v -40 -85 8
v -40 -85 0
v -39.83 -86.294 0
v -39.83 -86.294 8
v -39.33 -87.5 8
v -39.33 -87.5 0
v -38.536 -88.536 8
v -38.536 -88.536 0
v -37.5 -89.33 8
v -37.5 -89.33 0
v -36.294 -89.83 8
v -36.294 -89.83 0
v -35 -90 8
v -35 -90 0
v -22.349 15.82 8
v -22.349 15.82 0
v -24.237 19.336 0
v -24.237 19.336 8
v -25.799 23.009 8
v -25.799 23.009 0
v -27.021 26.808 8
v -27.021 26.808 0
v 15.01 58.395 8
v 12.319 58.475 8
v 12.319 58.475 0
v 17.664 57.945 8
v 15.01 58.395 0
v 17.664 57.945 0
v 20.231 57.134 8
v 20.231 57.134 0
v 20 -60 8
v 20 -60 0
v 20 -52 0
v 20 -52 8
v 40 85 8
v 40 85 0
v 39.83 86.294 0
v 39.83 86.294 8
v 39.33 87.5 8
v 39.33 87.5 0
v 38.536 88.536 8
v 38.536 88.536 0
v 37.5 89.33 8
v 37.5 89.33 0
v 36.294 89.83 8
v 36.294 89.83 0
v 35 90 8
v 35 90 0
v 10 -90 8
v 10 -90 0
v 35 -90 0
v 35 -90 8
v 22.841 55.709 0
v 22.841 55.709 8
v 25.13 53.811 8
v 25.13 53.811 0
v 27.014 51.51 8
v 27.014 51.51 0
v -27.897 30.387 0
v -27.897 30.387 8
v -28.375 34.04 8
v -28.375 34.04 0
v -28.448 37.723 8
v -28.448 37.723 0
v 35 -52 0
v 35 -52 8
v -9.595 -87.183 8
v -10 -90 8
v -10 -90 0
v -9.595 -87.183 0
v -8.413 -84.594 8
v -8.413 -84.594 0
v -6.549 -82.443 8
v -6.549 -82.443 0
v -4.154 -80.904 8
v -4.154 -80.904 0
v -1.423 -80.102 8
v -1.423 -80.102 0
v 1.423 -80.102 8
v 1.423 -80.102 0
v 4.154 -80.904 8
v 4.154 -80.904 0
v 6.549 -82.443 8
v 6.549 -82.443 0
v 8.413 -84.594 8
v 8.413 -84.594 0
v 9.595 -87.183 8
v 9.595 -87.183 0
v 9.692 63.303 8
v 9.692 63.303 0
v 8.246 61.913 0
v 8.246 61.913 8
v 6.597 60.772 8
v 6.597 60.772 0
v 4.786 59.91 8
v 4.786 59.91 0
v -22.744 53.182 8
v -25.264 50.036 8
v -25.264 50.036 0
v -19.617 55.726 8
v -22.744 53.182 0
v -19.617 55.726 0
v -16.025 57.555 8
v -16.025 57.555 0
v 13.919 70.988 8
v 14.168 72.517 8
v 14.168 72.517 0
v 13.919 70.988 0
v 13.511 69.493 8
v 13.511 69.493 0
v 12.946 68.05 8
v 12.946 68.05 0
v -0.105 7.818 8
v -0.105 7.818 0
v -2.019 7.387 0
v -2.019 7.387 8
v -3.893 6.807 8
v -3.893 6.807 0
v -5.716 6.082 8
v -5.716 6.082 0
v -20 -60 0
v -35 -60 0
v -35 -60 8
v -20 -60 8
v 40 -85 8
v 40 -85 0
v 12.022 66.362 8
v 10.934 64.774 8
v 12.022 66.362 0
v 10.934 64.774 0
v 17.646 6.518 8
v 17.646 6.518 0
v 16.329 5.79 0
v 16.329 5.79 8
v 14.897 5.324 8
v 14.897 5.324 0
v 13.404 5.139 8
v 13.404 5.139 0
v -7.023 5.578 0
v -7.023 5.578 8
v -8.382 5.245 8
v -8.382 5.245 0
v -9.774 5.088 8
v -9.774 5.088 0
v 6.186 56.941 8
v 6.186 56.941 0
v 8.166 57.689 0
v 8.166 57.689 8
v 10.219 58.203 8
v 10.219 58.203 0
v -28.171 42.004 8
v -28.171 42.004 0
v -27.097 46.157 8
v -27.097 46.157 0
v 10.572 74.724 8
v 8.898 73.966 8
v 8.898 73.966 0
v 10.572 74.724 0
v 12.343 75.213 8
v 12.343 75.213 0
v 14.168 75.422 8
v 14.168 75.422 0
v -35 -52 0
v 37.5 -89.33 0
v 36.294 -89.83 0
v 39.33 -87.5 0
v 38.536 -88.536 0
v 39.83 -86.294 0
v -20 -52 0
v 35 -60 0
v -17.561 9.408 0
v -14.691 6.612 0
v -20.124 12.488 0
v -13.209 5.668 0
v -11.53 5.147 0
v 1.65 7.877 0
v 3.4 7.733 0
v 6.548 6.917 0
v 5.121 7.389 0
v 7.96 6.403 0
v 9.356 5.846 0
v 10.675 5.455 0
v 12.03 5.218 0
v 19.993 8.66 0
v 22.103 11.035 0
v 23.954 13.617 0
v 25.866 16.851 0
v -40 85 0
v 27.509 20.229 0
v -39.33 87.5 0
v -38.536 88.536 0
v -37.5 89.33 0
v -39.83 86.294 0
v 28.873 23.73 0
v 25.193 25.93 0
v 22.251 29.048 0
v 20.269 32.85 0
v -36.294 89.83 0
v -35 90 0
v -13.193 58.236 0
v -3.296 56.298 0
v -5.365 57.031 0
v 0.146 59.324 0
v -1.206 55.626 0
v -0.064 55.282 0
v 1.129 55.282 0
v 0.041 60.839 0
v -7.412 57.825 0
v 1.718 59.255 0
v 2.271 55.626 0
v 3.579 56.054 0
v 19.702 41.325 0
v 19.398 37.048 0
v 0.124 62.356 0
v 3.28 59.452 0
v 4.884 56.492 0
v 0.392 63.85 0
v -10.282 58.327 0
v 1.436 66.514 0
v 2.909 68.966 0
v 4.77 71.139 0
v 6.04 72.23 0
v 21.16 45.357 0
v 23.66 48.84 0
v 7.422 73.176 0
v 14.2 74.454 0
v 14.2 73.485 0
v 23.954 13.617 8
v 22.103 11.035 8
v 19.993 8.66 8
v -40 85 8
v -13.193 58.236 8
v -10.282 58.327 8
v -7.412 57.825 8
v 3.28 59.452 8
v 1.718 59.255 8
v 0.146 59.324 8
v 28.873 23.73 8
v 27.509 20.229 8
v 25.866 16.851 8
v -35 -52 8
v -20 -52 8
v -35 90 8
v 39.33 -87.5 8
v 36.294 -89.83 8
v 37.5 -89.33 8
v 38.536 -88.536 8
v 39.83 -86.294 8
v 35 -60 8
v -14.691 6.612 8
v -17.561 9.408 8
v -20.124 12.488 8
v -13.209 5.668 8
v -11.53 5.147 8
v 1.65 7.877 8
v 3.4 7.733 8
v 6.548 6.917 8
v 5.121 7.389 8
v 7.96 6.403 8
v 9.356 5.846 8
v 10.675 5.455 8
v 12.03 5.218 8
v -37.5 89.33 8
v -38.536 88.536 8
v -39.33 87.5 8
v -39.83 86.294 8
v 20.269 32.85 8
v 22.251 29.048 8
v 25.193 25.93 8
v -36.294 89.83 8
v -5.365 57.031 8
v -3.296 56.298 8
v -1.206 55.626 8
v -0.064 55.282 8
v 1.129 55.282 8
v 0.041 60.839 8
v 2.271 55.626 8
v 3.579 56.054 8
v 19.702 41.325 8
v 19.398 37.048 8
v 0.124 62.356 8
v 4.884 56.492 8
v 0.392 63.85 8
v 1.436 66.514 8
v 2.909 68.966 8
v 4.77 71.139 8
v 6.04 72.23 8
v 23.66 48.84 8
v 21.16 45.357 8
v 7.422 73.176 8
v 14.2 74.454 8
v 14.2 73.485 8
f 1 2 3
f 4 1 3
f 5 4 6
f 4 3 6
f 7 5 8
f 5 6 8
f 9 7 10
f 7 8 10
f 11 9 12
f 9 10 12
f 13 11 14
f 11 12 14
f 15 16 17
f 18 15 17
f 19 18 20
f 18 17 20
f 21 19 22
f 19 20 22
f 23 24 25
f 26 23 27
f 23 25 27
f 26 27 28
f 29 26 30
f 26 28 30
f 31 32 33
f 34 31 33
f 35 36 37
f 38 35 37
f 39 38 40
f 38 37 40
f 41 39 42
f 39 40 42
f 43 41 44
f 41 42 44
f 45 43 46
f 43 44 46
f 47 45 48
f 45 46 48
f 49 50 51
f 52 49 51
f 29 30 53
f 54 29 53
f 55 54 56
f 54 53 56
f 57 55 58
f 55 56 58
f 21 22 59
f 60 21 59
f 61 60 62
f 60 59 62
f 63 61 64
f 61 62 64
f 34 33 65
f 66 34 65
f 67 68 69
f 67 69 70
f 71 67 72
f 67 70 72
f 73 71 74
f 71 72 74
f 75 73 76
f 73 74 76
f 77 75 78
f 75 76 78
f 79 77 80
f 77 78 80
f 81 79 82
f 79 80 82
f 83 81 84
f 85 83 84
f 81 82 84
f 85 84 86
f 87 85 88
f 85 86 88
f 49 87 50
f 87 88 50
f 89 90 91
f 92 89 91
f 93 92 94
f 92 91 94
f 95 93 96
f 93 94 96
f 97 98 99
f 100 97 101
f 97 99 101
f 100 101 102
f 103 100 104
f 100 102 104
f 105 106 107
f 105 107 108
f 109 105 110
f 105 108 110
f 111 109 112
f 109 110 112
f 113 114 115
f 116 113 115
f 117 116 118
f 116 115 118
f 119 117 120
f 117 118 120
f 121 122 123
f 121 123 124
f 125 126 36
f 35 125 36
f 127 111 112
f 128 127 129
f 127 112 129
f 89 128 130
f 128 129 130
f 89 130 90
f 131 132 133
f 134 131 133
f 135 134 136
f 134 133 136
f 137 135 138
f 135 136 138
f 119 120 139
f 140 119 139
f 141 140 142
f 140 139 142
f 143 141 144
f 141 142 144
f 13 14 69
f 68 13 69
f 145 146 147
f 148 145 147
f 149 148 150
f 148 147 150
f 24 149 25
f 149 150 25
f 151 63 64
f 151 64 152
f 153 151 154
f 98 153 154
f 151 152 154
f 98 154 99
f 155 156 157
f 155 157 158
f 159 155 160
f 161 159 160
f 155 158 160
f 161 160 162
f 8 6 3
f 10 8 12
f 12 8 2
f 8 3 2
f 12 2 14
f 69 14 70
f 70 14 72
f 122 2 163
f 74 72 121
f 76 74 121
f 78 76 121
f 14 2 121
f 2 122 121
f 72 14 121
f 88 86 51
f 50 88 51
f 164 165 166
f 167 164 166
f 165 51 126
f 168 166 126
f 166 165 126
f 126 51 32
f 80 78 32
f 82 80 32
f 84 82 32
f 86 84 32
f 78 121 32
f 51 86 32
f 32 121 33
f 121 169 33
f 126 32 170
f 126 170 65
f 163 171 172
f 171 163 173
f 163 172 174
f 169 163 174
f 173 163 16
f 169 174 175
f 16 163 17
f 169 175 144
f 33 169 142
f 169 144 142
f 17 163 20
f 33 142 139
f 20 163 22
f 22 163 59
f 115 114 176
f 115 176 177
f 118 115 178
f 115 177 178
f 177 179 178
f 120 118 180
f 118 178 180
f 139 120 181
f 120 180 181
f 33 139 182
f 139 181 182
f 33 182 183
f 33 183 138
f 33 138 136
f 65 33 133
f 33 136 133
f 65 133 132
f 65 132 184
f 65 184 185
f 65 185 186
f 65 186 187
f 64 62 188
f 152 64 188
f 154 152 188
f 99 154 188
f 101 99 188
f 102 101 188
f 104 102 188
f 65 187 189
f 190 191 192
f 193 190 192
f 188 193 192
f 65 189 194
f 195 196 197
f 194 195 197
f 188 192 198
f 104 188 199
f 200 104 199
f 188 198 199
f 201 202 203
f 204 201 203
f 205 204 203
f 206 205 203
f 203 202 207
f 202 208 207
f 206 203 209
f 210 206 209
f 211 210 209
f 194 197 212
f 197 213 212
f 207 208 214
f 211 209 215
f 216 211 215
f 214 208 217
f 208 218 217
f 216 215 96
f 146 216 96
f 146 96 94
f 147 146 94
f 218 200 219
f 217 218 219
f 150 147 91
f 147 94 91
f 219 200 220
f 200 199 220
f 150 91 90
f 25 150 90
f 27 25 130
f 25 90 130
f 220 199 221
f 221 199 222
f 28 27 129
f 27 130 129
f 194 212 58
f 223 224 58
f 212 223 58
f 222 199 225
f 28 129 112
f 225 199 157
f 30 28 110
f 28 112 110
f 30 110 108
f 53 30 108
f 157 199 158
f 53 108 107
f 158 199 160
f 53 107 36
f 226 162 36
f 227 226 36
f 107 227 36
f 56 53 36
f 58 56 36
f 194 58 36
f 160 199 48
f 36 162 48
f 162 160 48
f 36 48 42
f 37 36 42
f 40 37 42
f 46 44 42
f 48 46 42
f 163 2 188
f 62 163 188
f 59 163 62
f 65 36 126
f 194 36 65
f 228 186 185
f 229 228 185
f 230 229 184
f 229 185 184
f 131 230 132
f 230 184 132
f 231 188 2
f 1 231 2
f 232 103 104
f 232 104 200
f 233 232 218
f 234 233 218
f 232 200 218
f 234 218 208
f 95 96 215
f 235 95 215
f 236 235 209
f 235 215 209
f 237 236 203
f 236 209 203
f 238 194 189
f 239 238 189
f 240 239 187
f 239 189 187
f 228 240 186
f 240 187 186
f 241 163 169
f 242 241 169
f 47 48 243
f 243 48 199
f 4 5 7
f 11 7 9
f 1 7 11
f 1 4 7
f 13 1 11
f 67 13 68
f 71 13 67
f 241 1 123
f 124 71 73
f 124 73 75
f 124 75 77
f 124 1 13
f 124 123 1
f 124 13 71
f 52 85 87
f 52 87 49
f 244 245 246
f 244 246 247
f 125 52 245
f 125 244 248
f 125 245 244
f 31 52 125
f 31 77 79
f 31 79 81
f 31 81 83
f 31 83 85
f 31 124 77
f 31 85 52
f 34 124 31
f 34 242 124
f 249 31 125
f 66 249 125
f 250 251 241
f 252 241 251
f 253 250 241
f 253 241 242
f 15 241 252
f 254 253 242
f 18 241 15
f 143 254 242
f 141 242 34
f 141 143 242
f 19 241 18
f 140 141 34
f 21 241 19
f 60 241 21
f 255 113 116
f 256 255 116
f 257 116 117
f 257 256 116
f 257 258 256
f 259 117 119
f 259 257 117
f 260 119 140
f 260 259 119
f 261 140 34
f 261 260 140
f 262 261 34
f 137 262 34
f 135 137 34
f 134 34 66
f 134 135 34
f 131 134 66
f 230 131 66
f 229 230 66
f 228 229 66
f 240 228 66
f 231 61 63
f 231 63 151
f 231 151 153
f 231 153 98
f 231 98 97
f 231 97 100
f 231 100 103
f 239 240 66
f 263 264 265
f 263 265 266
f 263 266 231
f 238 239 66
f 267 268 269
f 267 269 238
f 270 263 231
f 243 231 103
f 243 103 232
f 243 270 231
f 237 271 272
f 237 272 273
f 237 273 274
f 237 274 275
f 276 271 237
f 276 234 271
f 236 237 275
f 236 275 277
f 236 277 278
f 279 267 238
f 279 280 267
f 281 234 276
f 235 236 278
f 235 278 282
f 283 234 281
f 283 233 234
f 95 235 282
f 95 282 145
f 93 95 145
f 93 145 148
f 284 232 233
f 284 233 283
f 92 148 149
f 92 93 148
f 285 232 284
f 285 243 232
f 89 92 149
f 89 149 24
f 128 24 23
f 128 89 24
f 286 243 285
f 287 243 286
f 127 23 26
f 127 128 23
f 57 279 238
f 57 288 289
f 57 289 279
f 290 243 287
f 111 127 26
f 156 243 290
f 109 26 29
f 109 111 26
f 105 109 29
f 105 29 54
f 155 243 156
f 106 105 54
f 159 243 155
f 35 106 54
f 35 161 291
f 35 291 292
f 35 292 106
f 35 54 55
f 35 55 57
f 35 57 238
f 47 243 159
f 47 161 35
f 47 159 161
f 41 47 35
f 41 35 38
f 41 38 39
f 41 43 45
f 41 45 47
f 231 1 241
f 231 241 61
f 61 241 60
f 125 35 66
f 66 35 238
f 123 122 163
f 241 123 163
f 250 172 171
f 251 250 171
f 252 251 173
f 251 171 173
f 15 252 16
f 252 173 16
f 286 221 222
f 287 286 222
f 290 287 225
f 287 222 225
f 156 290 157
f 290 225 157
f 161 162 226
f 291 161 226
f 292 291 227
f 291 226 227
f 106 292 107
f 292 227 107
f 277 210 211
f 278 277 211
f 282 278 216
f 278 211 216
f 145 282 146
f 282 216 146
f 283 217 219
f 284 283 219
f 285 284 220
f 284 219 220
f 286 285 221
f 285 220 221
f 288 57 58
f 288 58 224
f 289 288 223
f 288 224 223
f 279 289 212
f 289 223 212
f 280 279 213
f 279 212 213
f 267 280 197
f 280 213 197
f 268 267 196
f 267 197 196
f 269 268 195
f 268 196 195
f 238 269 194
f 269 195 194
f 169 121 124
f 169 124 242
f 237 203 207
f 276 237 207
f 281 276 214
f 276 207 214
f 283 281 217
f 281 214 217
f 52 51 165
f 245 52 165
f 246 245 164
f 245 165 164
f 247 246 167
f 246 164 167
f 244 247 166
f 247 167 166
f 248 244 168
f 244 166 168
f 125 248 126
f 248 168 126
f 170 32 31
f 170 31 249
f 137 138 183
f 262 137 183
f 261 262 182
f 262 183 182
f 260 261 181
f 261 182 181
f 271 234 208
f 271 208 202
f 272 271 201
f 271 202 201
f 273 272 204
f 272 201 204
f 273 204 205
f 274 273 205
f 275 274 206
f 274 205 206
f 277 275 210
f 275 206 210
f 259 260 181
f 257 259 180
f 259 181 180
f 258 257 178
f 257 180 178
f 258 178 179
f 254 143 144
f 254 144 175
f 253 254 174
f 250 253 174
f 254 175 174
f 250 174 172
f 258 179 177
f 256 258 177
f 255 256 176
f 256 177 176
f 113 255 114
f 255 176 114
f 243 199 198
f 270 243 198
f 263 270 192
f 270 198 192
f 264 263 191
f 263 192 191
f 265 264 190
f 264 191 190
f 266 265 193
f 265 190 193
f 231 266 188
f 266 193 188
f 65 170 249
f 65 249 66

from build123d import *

# Parameters (mm, degrees)
F0_W     = 15
F0_H     = 8
F1_DEPTH = 8


with BuildPart() as f1:
    # F0 (on Top) → F1 (new body)
    with BuildSketch(Plane.XY):
        with BuildLine():
            Line((35, 90), (-35, 90))
            ThreePointArc((-35, 90), (-38.535534, 88.535534), (-40, 85))
            Line((-40, 85), (-40, -85))
            ThreePointArc((-40, -85), (-38.535534, -88.535534), (-35, -90))
            Line((-35, -90), (-10, -90))
            ThreePointArc((-10, -90), (0, -80), (10, -90))
            Line((10, -90), (35, -90))
            ThreePointArc((35, -90), (38.535534, -88.535534), (40, -85))
            Line((40, -85), (40, 85))
            ThreePointArc((40, 85), (38.535534, 88.535534), (35, 90))
        make_face()
        with Locations((-27.5, -56)):
            Rectangle(F0_W, F0_H, mode=Mode.SUBTRACT)
        with Locations((27.5, -56)):
            Rectangle(F0_W, F0_H, mode=Mode.SUBTRACT)
        with BuildLine():
            ThreePointArc((-25.263863, 50.035905), (-21.248199, 54.537215), (-16.024871, 57.554531))
            ThreePointArc((-16.024871, 57.554531), (-11.73955, 58.355979), (-7.412411, 57.824786))
            ThreePointArc((-7.412411, 57.824786), (-4.333461, 56.657266), (-1.206209, 55.626086))
            ThreePointArc((-1.206209, 55.626086), (0.532304, 55.237841), (2.270817, 55.626086))
            ThreePointArc((2.270817, 55.626086), (4.232387, 56.271409), (6.185894, 56.940745))
            ThreePointArc((6.185894, 56.940745), (9.185146, 57.975997), (12.318602, 58.474708))
            ThreePointArc((12.318602, 58.474708), (16.344444, 58.21585), (20.230889, 57.134203))
            ThreePointArc((20.230889, 57.134203), (24.03083, 54.814647), (27.014145, 51.510147))
            ThreePointArc((27.014145, 51.510147), (19.39754, 37.048347), (28.872508, 23.729888))
            ThreePointArc((28.872508, 23.729888), (26.721586, 18.523644), (23.953715, 13.617492))
            ThreePointArc((23.953715, 13.617492), (21.078874, 9.819793), (17.645785, 6.518109))
            ThreePointArc((17.645785, 6.518109), (15.624159, 5.522715), (13.403592, 5.139485))
            ThreePointArc((13.403592, 5.139485), (11.34891, 5.316623), (9.355833, 5.846472))
            ThreePointArc((9.355833, 5.846472), (7.255639, 6.665034), (5.120978, 7.388972))
            ThreePointArc((5.120978, 7.388972), (2.526786, 7.830283), (-0.104646, 7.817823))
            ThreePointArc((-0.104646, 7.817823), (-2.961809, 7.11564), (-5.716313, 6.081646))
            ThreePointArc((-5.716313, 6.081646), (-7.69726, 5.390047), (-9.773637, 5.088192))
            ThreePointArc((-9.773637, 5.088192), (-12.386956, 5.351298), (-14.690942, 6.612374))
            ThreePointArc((-14.690942, 6.612374), (-18.882856, 10.914265), (-22.349224, 15.81964))
            ThreePointArc((-22.349224, 15.81964), (-25.059935, 21.154457), (-27.020738, 26.808083))
            ThreePointArc((-27.020738, 26.808083), (-28.186358, 32.206624), (-28.448275, 37.723354))
            ThreePointArc((-28.448275, 37.723354), (-27.731572, 44.106062), (-25.263863, 50.035905))
        make_face(mode=Mode.SUBTRACT)
        with BuildLine():
            ThreePointArc((8.898433, 73.965858), (11.447708, 75.003195), (14.167834, 75.422469))
            ThreePointArc((14.167834, 75.422469), (14.204445, 73.96984), (14.167834, 72.517212))
            ThreePointArc((14.167834, 72.517212), (13.734786, 70.23514), (12.945735, 68.05047))
            ThreePointArc((12.945735, 68.05047), (11.497905, 65.553995), (9.692127, 63.302826))
            ThreePointArc((9.692127, 63.302826), (7.444453, 61.309154), (4.785833, 59.909686))
            ThreePointArc((4.785833, 59.909686), (2.503152, 59.320401), (0.145637, 59.324383))
            ThreePointArc((0.145637, 59.324383), (0.059444, 61.598708), (0.392238, 63.850205))
            ThreePointArc((0.392238, 63.850205), (2.121034, 67.770658), (4.769809, 71.138549))
            ThreePointArc((4.769809, 71.138549), (6.717839, 72.722006), (8.898433, 73.965858))
        make_face(mode=Mode.SUBTRACT)
    extrude(amount=F1_DEPTH)


solid = f1.part
